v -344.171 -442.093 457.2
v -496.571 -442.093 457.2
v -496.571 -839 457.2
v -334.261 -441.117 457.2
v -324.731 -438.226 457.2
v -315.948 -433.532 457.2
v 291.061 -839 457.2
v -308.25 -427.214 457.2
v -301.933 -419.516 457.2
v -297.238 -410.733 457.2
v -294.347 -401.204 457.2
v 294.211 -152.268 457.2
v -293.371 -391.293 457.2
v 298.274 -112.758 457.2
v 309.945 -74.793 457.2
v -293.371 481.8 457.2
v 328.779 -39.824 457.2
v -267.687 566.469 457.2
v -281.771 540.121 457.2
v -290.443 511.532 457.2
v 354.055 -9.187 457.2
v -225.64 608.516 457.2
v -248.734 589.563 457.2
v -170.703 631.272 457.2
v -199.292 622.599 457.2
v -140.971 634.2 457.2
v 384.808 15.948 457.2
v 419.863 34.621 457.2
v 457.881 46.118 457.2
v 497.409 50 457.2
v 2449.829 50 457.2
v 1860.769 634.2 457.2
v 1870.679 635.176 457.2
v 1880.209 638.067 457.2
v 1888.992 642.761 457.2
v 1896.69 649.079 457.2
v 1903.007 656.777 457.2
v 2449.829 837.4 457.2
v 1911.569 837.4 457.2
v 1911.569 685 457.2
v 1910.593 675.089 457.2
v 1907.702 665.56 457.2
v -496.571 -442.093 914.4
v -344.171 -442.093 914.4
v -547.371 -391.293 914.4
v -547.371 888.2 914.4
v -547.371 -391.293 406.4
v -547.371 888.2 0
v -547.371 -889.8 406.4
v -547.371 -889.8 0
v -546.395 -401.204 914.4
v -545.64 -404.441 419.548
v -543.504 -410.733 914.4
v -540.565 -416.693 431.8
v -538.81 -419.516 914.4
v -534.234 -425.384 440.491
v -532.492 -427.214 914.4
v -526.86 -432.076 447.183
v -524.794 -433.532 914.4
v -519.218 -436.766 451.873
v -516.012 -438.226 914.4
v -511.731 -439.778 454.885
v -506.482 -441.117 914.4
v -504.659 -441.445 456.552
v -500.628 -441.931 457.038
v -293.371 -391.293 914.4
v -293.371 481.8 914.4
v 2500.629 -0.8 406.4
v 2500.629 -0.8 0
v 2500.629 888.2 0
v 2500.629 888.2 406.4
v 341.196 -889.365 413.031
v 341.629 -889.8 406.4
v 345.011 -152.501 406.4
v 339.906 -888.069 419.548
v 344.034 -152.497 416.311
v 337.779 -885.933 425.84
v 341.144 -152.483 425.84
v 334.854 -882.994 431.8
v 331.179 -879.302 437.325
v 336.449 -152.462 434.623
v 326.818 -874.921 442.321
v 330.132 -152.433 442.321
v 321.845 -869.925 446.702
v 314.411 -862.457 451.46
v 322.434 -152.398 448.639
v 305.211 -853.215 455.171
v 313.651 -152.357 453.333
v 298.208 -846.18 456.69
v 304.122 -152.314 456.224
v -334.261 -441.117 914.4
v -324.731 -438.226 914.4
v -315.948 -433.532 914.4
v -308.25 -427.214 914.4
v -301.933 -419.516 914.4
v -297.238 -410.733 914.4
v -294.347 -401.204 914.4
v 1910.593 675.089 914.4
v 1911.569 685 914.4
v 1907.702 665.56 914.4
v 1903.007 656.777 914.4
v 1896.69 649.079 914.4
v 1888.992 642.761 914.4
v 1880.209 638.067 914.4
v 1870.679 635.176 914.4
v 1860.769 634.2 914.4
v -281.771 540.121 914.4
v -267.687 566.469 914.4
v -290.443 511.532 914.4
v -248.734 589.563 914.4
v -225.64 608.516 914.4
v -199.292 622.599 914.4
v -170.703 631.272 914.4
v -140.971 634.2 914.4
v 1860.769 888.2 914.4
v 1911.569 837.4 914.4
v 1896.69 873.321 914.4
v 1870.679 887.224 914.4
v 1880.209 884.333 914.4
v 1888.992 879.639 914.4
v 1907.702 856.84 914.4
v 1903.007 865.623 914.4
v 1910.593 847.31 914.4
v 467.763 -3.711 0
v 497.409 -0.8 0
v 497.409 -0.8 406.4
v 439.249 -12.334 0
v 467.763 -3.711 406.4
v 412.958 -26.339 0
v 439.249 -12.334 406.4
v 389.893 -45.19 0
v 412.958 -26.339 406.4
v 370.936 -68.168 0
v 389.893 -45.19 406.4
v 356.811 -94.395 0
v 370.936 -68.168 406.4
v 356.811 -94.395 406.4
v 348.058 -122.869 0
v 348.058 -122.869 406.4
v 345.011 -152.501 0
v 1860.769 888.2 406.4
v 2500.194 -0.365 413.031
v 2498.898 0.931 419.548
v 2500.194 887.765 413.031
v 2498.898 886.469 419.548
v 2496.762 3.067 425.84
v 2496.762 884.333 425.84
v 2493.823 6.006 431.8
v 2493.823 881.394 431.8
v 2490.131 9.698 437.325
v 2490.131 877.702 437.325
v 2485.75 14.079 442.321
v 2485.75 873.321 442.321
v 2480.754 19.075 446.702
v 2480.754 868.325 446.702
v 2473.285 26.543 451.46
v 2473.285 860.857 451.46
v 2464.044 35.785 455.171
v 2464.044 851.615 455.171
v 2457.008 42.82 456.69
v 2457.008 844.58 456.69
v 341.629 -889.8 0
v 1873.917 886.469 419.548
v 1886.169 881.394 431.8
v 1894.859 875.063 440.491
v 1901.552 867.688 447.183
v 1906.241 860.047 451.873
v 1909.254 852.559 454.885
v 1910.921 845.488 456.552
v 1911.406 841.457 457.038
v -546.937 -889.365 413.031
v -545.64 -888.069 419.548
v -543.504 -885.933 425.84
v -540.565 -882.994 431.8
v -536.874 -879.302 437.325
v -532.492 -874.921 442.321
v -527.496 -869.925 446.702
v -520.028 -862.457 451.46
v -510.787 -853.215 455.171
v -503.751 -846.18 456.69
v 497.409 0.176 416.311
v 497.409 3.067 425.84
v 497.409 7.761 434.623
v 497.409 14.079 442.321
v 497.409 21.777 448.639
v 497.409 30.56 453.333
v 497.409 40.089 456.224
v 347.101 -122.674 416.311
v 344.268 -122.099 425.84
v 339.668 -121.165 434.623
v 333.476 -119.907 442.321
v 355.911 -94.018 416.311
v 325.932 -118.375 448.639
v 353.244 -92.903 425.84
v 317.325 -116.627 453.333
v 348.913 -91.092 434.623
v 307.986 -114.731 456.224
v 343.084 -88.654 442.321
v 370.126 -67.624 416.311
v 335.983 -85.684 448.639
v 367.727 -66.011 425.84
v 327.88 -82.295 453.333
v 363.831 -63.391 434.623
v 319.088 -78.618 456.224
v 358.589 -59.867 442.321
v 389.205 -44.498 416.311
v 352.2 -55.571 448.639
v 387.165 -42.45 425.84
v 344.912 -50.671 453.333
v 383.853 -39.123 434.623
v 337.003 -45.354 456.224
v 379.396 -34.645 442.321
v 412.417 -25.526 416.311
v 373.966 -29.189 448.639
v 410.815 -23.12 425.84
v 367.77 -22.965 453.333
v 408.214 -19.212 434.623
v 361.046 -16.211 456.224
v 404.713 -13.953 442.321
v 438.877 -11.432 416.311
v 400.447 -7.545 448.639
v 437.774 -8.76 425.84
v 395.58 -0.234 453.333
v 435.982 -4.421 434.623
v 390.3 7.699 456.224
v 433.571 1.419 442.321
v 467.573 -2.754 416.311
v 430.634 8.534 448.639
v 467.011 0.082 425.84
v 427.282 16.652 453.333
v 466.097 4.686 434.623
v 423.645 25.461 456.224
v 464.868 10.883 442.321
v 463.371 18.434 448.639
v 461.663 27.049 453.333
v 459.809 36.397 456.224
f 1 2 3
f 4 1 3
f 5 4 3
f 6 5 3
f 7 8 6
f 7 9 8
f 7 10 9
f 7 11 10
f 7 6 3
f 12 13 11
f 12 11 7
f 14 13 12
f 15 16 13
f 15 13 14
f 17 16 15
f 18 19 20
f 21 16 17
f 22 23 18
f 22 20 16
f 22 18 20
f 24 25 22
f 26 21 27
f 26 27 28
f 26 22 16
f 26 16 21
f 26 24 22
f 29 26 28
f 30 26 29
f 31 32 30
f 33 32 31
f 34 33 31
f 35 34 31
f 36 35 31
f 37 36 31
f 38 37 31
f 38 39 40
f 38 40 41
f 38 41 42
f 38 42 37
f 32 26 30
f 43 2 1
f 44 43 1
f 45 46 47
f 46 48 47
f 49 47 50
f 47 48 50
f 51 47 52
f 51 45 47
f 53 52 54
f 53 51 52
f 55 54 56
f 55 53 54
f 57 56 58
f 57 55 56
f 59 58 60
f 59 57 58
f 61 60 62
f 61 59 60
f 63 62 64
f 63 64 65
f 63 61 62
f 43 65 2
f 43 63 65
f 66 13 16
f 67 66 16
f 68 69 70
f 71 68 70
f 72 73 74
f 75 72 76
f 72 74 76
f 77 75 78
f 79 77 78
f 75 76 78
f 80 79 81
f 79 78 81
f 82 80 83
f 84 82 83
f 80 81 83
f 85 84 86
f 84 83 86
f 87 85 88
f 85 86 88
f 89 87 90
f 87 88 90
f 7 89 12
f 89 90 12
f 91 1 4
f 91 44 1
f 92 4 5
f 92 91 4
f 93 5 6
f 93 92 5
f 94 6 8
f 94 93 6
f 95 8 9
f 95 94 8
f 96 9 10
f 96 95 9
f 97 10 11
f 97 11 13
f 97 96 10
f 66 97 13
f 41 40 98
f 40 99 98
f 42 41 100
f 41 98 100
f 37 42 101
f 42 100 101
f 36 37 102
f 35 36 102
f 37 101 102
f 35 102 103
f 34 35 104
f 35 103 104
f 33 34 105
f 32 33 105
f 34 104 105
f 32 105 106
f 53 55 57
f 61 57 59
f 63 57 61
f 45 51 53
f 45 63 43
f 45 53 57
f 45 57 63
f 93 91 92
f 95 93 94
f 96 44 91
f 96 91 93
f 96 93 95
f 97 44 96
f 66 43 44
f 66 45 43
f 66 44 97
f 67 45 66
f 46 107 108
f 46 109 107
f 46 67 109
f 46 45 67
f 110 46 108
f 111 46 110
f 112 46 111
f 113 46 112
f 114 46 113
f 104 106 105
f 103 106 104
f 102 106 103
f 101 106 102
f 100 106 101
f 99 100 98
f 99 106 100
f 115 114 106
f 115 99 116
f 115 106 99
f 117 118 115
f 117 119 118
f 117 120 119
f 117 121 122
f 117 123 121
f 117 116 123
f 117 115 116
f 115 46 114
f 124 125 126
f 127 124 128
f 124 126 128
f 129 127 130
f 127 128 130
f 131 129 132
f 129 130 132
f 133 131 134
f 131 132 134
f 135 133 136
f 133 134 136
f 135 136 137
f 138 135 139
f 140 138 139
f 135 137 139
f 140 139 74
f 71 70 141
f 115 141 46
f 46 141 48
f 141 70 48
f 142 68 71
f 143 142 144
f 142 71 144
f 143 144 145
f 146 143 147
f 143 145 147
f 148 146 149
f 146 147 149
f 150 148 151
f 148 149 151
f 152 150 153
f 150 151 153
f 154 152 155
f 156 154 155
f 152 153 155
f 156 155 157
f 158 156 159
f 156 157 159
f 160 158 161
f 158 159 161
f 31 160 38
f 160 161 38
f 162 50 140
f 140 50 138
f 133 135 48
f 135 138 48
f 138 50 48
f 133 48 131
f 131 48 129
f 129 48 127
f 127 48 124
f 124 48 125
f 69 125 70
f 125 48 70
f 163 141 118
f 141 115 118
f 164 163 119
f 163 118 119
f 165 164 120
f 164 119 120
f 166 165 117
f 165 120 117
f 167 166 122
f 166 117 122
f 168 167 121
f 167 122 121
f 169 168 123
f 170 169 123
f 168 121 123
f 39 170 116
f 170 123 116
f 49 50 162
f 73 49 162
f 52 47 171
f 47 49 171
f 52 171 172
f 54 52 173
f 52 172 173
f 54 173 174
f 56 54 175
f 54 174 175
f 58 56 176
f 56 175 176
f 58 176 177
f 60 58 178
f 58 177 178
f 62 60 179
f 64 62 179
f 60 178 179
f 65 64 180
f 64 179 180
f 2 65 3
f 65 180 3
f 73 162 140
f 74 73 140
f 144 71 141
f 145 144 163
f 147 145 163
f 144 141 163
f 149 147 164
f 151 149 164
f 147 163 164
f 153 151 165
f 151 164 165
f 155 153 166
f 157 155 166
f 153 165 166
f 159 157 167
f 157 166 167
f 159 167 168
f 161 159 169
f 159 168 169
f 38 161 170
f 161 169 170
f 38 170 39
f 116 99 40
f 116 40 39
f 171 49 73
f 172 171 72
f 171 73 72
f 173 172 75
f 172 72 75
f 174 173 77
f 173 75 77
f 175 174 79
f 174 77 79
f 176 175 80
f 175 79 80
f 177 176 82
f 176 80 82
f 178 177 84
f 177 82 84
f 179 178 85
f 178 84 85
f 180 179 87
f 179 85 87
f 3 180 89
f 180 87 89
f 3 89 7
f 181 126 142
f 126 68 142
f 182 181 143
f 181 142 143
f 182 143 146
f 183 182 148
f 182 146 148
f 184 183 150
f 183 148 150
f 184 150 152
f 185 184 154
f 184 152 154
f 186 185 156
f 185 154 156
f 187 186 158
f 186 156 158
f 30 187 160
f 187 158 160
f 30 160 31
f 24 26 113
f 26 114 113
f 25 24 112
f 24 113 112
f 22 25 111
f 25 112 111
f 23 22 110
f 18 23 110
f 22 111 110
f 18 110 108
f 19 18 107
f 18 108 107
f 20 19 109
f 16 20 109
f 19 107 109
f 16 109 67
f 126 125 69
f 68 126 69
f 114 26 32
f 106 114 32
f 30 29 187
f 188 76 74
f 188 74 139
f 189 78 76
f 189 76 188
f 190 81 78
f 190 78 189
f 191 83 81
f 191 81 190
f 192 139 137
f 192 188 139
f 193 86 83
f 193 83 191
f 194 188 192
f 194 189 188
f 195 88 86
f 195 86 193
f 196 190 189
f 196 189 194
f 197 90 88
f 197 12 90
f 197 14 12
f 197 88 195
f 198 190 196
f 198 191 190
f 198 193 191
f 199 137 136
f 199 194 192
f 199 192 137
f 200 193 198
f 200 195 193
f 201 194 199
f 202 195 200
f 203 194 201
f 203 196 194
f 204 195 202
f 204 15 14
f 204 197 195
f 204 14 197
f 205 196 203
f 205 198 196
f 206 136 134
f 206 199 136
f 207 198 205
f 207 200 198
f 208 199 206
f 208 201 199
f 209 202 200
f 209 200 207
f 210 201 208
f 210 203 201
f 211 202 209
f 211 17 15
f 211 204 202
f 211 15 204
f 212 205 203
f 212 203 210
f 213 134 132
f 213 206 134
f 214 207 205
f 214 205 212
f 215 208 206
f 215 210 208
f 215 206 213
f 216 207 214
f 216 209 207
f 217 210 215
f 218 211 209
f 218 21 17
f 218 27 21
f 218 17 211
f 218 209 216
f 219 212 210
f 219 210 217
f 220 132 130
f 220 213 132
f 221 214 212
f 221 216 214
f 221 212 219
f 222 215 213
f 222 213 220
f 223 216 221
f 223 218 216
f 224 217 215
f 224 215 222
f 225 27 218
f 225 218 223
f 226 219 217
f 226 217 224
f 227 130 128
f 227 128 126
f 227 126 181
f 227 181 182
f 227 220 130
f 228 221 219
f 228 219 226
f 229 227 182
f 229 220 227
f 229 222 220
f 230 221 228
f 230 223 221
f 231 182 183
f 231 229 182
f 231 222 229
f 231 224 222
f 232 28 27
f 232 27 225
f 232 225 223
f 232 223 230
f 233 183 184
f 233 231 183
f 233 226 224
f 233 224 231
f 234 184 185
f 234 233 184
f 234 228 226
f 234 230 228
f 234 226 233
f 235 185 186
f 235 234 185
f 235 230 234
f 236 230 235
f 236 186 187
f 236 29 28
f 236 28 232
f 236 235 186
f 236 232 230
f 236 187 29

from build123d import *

# Parameters (mm, degrees)
F1_DEPTH = 457.2
F3_DEPTH = 457.2
F4_R     = 152.4
F5_R     = 50.8


with BuildPart() as f1:
    # F0 (on Top) → F1 (new body)
    with BuildSketch(Plane.XY):
        Polygon((-547.3713837611, -889.8000992239), (341.6286162389, -889.8000992239), (345.7063734531, -0.8000992239), (2500.6286162389, -0.8000992239), (2500.6286162389, 888.1999007761), (-547.3713837611, 888.1999007761), align=None)
    extrude(amount=F1_DEPTH)

    # F2 (on face) → F3 (join)
    with BuildSketch(Plane.XY.offset(457.2)):
        Polygon((-547.3713837611, 888.1999007761), (-547.3713837611, -442.0930147171), (-293.3713837611, -442.0930147171), (-293.3713837611, 634.1999007761), (1911.5686416626, 634.1999007761), (1911.5686416626, 888.1999007761), align=None)
    extrude(amount=F3_DEPTH)

    # F4
    f4_edges = [f1.edges().sort_by_distance(p)[0] for p in [
        (-293.371384, 634.199901, 685.8),
        (345.706373, -0.800099, 228.6),
    ]]
    fillet(f4_edges, radius=F4_R)

    # F5
    f5_edges = [f1.edges().sort_by_distance(p)[0] for p in [
        (1911.568642, 634.199901, 685.8),
        (1911.568642, 888.199901, 685.8),
        (2500.628616, 443.699901, 457.2),
        (-102.871384, -889.800099, 457.2),
        (343.319576, -521.150581, 457.2),
        (2206.098629, 888.199901, 457.2),
        (-547.371384, -665.946557, 457.2),
        (-293.371384, -442.093015, 685.8),
        (-547.371384, -442.093015, 685.8),
    ]]
    fillet(f5_edges, radius=F5_R)


solid = f1.part
